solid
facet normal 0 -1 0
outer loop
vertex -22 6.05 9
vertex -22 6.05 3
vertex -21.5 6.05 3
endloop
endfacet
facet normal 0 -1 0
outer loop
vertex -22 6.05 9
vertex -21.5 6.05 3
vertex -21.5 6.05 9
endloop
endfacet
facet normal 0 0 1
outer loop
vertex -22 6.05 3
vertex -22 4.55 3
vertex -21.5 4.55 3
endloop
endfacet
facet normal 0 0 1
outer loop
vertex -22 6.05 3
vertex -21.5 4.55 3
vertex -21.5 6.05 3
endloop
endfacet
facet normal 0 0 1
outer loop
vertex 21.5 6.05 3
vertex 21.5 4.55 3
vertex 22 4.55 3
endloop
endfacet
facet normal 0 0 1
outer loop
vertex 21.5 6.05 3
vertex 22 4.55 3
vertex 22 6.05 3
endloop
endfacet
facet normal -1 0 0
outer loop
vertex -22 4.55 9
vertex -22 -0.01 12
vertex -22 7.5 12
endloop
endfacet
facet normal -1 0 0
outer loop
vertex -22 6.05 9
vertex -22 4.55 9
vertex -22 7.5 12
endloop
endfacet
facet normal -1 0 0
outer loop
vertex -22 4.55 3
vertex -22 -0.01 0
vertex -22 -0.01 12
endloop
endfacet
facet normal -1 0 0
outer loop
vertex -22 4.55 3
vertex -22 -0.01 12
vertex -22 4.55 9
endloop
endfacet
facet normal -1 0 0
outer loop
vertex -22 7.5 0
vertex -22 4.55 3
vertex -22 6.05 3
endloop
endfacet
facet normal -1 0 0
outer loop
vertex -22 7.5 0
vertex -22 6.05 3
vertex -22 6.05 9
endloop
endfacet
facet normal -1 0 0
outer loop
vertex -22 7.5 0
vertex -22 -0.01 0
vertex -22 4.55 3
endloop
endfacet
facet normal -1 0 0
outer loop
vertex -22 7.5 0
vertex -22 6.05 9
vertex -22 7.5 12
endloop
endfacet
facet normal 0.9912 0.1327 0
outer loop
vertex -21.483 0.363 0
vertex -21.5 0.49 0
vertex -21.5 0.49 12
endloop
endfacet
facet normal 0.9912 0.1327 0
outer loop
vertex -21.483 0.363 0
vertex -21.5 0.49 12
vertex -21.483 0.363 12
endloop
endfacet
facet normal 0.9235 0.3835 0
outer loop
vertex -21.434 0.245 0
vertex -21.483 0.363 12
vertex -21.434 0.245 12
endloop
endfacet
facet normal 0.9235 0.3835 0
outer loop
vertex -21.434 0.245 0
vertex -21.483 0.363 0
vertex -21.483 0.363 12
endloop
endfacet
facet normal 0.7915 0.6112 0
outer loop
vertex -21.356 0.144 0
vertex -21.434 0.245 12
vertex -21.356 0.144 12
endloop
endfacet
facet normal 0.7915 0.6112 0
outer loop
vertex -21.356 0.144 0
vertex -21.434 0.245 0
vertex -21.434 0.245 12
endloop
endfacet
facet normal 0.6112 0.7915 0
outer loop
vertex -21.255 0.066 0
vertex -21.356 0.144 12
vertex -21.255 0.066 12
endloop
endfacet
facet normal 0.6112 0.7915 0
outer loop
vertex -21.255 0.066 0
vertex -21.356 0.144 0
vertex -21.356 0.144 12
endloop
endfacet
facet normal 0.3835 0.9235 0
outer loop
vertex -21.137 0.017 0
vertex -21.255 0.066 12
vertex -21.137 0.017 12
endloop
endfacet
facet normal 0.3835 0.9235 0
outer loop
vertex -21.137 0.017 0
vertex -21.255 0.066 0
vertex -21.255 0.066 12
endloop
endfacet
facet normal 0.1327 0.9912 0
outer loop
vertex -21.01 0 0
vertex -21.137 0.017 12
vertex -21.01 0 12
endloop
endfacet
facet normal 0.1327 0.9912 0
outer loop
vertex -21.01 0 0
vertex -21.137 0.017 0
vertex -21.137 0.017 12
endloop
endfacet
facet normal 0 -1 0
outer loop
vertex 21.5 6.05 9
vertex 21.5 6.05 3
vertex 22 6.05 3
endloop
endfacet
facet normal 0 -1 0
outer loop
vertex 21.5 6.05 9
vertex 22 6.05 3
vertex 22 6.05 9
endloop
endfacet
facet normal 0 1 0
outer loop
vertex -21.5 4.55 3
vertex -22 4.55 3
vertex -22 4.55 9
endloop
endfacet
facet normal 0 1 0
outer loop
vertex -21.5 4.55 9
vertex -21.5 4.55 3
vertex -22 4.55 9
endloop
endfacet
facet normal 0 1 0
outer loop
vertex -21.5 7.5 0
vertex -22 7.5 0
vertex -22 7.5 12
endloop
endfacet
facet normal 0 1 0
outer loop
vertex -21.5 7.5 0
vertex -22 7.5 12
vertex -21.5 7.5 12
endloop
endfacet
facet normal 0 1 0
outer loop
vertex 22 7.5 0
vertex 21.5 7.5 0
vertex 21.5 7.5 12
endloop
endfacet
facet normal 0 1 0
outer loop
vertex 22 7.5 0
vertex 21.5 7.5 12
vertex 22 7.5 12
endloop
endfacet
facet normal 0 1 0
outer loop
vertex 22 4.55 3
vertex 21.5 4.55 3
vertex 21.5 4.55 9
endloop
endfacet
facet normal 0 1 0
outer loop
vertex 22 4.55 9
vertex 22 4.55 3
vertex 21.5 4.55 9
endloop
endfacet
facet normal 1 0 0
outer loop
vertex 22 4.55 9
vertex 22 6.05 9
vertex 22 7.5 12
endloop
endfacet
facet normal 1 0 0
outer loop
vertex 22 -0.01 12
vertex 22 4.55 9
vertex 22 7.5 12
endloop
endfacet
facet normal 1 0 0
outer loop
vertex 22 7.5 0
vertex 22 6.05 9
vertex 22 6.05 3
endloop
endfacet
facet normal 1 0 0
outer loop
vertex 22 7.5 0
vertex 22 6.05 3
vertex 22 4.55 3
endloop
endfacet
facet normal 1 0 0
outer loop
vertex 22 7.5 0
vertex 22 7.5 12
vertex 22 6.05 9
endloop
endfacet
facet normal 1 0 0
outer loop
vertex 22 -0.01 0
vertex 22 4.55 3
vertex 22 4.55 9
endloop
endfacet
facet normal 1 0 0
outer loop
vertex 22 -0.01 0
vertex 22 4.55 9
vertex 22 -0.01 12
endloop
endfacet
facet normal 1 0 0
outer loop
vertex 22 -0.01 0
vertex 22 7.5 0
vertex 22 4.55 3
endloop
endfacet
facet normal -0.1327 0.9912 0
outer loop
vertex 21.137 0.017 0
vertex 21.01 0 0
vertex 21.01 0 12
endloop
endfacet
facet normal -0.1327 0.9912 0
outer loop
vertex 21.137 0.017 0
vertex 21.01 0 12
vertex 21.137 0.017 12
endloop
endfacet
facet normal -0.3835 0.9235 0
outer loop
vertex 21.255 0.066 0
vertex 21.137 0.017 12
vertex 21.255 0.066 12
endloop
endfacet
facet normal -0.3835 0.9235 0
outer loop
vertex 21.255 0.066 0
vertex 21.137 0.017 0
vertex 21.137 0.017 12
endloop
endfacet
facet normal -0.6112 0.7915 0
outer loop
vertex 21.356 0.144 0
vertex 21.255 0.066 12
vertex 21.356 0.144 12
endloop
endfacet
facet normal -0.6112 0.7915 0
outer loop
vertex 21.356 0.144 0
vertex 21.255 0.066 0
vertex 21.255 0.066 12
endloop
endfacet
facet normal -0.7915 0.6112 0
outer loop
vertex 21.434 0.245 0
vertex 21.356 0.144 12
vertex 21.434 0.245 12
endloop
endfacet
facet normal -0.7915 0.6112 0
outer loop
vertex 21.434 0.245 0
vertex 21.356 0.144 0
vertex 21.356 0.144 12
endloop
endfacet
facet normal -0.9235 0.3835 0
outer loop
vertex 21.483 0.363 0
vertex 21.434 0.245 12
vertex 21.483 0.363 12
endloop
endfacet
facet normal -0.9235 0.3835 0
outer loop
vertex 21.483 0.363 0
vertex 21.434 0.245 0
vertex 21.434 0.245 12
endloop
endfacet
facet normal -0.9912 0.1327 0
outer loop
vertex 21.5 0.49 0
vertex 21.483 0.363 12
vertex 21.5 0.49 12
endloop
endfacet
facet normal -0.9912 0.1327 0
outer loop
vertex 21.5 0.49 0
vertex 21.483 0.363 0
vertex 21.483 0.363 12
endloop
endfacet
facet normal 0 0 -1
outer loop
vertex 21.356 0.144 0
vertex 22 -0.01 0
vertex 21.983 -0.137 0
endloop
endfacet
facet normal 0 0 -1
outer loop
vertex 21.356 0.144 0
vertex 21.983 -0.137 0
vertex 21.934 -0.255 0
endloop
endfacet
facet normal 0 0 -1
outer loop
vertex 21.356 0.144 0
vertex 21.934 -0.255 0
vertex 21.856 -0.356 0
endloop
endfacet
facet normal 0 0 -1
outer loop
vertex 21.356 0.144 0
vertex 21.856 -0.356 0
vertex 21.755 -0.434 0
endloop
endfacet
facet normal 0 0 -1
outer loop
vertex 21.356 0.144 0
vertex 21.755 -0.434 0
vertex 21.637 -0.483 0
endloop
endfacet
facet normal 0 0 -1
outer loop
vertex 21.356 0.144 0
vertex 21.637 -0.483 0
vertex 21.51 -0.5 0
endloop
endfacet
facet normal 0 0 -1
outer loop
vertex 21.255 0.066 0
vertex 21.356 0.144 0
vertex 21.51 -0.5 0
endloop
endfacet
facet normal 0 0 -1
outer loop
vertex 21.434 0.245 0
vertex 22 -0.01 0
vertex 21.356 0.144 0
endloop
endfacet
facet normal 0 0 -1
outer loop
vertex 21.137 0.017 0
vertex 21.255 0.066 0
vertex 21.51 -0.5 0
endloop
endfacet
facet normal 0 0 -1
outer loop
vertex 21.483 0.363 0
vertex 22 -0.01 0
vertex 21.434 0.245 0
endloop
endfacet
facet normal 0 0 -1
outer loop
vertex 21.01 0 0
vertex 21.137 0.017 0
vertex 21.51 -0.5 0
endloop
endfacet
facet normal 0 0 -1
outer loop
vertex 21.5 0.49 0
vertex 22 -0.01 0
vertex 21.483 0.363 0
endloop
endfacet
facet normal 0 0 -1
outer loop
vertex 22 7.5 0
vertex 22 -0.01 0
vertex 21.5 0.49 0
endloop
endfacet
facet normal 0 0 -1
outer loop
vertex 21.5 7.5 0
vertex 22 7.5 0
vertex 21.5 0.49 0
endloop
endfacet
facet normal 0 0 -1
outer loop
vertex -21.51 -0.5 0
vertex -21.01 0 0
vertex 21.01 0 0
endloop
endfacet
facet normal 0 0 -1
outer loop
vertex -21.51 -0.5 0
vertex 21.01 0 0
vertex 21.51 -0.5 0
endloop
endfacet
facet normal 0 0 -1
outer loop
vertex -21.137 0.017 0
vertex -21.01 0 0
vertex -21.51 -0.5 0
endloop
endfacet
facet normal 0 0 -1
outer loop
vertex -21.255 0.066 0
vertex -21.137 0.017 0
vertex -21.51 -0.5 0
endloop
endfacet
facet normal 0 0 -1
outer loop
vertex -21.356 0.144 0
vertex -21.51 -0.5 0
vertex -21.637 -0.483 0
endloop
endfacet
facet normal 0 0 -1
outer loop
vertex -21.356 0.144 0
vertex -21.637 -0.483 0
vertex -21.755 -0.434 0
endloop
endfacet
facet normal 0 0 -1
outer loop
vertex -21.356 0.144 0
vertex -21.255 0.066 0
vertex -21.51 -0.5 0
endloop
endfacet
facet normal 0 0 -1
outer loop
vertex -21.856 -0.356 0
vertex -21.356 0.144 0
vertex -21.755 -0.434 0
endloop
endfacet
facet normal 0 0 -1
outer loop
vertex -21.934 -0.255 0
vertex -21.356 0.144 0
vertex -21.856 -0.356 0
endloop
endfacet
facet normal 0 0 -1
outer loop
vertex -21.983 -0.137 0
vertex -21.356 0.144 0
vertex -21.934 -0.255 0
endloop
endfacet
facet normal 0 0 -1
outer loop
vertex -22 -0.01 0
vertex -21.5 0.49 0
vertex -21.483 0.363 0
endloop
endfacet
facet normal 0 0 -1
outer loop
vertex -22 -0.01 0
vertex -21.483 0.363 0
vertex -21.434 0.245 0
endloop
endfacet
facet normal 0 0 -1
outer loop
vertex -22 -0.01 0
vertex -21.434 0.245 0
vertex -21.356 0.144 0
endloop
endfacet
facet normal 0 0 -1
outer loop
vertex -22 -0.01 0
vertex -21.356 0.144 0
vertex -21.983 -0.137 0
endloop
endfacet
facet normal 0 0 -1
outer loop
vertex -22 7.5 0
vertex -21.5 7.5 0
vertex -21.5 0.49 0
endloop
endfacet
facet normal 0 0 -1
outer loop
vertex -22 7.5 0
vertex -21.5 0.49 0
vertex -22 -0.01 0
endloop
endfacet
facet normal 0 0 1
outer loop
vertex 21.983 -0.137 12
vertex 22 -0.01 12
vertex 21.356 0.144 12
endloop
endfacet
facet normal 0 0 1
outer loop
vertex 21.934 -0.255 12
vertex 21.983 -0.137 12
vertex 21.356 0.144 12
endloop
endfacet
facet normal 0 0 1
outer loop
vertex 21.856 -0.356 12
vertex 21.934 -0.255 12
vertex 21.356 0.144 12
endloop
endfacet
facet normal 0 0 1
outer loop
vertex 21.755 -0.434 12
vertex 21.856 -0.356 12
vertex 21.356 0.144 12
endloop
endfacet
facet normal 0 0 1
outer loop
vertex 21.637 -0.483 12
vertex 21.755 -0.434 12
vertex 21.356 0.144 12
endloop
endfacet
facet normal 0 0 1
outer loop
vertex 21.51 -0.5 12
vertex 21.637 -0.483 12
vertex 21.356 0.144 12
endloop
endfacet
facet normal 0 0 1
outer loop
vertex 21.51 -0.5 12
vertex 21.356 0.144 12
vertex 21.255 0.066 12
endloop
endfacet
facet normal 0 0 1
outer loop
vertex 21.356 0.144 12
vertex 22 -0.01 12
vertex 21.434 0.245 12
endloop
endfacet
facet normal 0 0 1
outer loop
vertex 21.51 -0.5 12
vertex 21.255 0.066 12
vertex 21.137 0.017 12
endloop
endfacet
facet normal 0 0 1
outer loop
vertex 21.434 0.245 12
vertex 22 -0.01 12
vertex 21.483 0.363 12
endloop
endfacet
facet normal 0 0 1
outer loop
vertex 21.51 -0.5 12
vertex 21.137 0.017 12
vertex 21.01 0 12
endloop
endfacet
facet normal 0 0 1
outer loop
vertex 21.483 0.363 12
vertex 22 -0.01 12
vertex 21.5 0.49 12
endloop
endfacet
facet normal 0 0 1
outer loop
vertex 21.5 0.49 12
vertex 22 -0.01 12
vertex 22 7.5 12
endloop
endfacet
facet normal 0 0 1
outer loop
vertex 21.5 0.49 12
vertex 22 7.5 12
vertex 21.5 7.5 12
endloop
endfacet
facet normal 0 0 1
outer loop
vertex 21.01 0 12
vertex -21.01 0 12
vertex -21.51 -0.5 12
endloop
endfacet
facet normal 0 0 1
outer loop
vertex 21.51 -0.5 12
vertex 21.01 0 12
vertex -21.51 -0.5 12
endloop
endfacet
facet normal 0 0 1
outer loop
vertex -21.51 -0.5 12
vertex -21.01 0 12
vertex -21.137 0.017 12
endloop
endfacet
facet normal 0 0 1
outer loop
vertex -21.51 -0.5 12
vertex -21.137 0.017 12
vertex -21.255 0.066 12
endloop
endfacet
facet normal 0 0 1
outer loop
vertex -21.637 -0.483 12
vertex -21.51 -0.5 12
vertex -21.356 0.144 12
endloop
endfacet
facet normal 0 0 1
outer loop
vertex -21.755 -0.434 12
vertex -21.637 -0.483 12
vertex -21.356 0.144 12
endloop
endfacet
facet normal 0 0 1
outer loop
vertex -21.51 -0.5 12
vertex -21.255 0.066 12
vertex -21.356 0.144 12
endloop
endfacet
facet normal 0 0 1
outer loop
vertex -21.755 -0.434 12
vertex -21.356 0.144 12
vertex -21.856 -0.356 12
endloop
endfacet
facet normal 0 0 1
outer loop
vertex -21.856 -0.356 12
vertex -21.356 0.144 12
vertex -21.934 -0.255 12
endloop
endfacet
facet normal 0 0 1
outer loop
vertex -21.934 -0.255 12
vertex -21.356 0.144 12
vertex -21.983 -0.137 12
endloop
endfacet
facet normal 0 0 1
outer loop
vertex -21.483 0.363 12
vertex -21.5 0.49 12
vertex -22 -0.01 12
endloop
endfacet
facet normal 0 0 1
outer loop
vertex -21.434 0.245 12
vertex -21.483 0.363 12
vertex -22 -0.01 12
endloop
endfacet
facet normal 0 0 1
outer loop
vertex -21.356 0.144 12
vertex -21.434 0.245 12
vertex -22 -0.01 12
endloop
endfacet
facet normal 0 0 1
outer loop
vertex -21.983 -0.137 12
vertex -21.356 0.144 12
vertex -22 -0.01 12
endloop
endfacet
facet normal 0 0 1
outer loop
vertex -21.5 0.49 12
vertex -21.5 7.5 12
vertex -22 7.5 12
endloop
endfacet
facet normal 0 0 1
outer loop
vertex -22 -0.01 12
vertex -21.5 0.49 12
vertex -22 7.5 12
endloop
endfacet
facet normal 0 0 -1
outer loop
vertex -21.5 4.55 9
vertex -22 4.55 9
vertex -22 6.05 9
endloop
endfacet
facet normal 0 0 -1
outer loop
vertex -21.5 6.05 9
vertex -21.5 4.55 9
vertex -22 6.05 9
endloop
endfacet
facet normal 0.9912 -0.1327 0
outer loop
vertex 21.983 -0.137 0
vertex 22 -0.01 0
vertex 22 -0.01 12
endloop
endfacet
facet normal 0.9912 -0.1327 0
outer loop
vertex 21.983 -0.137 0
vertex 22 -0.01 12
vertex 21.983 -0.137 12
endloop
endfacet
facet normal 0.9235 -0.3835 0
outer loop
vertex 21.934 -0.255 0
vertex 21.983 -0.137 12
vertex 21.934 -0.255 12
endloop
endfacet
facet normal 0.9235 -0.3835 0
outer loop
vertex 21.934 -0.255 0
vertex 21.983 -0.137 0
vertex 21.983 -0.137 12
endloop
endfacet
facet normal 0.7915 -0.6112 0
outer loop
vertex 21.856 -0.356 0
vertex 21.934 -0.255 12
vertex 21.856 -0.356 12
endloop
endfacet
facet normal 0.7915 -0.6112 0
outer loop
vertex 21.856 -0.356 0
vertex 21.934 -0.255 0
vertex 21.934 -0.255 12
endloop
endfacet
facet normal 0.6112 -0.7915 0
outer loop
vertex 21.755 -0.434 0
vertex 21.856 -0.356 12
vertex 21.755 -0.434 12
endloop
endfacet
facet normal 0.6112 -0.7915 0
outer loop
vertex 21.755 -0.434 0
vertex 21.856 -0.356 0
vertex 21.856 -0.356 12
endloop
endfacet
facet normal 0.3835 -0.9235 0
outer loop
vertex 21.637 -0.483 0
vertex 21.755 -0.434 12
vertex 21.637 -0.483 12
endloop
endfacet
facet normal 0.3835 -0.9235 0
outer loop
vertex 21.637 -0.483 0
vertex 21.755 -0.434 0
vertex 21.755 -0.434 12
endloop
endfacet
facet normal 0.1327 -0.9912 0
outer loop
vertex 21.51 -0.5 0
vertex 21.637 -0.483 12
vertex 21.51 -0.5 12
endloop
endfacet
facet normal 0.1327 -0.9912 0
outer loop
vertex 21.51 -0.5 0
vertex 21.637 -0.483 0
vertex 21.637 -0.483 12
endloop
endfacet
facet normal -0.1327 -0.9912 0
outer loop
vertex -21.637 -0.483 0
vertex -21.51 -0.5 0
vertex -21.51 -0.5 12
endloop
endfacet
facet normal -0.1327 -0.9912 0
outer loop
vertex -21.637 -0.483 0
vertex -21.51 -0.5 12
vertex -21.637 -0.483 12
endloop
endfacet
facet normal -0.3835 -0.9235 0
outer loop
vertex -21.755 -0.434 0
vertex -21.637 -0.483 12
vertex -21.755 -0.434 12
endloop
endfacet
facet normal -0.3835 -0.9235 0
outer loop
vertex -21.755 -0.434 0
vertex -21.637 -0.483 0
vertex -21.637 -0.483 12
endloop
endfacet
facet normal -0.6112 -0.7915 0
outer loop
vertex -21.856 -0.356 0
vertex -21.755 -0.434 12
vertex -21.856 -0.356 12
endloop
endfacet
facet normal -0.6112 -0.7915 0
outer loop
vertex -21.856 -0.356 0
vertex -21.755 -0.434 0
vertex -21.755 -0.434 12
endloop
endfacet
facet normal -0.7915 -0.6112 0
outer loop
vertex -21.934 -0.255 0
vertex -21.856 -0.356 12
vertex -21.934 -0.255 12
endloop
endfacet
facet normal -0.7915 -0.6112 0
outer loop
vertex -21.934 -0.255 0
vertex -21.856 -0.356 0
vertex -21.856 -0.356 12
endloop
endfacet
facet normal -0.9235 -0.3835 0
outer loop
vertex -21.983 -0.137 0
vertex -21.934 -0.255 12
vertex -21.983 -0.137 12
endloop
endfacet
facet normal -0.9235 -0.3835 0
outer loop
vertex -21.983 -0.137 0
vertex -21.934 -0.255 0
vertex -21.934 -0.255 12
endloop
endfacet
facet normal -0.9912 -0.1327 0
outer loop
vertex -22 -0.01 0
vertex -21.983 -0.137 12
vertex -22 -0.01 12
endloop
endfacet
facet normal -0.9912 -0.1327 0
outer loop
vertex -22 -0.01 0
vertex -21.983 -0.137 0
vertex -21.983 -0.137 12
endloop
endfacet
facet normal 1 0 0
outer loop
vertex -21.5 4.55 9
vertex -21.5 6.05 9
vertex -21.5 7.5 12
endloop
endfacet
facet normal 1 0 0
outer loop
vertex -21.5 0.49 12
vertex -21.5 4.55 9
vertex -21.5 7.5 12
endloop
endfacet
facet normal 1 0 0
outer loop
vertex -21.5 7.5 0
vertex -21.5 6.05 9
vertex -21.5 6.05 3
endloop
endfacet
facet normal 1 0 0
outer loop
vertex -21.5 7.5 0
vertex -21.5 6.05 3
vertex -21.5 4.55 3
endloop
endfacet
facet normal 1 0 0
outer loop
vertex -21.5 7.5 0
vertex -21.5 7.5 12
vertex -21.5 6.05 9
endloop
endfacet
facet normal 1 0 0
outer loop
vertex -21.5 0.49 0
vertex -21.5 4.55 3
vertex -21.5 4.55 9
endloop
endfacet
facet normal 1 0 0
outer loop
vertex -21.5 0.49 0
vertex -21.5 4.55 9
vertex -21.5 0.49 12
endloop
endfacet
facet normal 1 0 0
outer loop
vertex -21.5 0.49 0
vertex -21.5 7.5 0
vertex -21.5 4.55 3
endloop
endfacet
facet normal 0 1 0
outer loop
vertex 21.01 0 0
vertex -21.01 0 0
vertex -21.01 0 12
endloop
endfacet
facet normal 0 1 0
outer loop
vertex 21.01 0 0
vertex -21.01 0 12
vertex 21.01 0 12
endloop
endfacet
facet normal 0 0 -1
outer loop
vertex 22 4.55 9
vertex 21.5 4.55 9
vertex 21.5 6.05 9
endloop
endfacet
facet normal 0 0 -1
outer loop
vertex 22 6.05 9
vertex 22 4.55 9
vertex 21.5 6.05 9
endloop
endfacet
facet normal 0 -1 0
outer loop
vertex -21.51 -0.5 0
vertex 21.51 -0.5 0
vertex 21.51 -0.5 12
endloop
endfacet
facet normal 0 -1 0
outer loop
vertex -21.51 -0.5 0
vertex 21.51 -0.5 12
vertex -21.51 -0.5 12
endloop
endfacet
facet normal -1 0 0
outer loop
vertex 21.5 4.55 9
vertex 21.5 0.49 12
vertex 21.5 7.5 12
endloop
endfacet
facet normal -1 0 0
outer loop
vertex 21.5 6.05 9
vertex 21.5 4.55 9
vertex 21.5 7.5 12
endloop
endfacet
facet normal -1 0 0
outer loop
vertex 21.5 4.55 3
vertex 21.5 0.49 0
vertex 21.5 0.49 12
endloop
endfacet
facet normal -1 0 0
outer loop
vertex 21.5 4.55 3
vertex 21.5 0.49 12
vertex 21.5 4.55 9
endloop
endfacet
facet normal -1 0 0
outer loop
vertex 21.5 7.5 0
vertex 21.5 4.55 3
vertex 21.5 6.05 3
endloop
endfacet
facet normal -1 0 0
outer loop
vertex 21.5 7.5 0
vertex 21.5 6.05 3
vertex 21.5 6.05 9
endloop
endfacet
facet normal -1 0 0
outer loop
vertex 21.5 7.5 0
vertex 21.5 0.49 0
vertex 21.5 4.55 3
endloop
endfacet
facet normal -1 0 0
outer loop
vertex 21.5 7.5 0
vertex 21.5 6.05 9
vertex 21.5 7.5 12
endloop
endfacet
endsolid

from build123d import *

# Parameters (mm, degrees)
BOSS_EXTRUDE1_DEPTH = 12
SKETCH2_W           = 6
SKETCH2_H           = 1.5
CUT_EXTRUDE1_DEPTH  = 45


with BuildPart() as part:
    # Sketch1 → Boss-Extrude1 (new body)
    with BuildSketch(Plane.XY):
        with BuildLine():
            Line((-21.5, 7.5), (-21.5, 0.49))
            ThreePointArc((-21.5, 0.49), (-21.356482323, 0.143517677), (-21.01, 0))
            Line((-21.01, 0), (0, 0))
            Line((0, 0), (21.01, 0))
            ThreePointArc((21.01, 0), (21.356482323, 0.143517677), (21.5, 0.49))
            Line((21.5, 0.49), (21.5, 7.5))
            Line((21.5, 7.5), (22, 7.5))
            Line((22, 7.5), (22, -0.01))
            ThreePointArc((22, -0.01), (21.856482323, -0.356482323), (21.51, -0.5))
            Line((21.51, -0.5), (-21.51, -0.5))
            ThreePointArc((-21.51, -0.5), (-21.856482323, -0.356482323), (-22, -0.01))
            Line((-22, -0.01), (-22, 7.5))
            Line((-22, 7.5), (-21.5, 7.5))
        make_face()
    extrude(amount=BOSS_EXTRUDE1_DEPTH)

    # Sketch2 → Cut-Extrude1 (cut, through all)
    with BuildSketch(Plane.ZY.offset(22)):
        with Locations((6, 5.3)):
            Rectangle(SKETCH2_W, SKETCH2_H)
    extrude(amount=-CUT_EXTRUDE1_DEPTH, mode=Mode.SUBTRACT)


solid = part.part
